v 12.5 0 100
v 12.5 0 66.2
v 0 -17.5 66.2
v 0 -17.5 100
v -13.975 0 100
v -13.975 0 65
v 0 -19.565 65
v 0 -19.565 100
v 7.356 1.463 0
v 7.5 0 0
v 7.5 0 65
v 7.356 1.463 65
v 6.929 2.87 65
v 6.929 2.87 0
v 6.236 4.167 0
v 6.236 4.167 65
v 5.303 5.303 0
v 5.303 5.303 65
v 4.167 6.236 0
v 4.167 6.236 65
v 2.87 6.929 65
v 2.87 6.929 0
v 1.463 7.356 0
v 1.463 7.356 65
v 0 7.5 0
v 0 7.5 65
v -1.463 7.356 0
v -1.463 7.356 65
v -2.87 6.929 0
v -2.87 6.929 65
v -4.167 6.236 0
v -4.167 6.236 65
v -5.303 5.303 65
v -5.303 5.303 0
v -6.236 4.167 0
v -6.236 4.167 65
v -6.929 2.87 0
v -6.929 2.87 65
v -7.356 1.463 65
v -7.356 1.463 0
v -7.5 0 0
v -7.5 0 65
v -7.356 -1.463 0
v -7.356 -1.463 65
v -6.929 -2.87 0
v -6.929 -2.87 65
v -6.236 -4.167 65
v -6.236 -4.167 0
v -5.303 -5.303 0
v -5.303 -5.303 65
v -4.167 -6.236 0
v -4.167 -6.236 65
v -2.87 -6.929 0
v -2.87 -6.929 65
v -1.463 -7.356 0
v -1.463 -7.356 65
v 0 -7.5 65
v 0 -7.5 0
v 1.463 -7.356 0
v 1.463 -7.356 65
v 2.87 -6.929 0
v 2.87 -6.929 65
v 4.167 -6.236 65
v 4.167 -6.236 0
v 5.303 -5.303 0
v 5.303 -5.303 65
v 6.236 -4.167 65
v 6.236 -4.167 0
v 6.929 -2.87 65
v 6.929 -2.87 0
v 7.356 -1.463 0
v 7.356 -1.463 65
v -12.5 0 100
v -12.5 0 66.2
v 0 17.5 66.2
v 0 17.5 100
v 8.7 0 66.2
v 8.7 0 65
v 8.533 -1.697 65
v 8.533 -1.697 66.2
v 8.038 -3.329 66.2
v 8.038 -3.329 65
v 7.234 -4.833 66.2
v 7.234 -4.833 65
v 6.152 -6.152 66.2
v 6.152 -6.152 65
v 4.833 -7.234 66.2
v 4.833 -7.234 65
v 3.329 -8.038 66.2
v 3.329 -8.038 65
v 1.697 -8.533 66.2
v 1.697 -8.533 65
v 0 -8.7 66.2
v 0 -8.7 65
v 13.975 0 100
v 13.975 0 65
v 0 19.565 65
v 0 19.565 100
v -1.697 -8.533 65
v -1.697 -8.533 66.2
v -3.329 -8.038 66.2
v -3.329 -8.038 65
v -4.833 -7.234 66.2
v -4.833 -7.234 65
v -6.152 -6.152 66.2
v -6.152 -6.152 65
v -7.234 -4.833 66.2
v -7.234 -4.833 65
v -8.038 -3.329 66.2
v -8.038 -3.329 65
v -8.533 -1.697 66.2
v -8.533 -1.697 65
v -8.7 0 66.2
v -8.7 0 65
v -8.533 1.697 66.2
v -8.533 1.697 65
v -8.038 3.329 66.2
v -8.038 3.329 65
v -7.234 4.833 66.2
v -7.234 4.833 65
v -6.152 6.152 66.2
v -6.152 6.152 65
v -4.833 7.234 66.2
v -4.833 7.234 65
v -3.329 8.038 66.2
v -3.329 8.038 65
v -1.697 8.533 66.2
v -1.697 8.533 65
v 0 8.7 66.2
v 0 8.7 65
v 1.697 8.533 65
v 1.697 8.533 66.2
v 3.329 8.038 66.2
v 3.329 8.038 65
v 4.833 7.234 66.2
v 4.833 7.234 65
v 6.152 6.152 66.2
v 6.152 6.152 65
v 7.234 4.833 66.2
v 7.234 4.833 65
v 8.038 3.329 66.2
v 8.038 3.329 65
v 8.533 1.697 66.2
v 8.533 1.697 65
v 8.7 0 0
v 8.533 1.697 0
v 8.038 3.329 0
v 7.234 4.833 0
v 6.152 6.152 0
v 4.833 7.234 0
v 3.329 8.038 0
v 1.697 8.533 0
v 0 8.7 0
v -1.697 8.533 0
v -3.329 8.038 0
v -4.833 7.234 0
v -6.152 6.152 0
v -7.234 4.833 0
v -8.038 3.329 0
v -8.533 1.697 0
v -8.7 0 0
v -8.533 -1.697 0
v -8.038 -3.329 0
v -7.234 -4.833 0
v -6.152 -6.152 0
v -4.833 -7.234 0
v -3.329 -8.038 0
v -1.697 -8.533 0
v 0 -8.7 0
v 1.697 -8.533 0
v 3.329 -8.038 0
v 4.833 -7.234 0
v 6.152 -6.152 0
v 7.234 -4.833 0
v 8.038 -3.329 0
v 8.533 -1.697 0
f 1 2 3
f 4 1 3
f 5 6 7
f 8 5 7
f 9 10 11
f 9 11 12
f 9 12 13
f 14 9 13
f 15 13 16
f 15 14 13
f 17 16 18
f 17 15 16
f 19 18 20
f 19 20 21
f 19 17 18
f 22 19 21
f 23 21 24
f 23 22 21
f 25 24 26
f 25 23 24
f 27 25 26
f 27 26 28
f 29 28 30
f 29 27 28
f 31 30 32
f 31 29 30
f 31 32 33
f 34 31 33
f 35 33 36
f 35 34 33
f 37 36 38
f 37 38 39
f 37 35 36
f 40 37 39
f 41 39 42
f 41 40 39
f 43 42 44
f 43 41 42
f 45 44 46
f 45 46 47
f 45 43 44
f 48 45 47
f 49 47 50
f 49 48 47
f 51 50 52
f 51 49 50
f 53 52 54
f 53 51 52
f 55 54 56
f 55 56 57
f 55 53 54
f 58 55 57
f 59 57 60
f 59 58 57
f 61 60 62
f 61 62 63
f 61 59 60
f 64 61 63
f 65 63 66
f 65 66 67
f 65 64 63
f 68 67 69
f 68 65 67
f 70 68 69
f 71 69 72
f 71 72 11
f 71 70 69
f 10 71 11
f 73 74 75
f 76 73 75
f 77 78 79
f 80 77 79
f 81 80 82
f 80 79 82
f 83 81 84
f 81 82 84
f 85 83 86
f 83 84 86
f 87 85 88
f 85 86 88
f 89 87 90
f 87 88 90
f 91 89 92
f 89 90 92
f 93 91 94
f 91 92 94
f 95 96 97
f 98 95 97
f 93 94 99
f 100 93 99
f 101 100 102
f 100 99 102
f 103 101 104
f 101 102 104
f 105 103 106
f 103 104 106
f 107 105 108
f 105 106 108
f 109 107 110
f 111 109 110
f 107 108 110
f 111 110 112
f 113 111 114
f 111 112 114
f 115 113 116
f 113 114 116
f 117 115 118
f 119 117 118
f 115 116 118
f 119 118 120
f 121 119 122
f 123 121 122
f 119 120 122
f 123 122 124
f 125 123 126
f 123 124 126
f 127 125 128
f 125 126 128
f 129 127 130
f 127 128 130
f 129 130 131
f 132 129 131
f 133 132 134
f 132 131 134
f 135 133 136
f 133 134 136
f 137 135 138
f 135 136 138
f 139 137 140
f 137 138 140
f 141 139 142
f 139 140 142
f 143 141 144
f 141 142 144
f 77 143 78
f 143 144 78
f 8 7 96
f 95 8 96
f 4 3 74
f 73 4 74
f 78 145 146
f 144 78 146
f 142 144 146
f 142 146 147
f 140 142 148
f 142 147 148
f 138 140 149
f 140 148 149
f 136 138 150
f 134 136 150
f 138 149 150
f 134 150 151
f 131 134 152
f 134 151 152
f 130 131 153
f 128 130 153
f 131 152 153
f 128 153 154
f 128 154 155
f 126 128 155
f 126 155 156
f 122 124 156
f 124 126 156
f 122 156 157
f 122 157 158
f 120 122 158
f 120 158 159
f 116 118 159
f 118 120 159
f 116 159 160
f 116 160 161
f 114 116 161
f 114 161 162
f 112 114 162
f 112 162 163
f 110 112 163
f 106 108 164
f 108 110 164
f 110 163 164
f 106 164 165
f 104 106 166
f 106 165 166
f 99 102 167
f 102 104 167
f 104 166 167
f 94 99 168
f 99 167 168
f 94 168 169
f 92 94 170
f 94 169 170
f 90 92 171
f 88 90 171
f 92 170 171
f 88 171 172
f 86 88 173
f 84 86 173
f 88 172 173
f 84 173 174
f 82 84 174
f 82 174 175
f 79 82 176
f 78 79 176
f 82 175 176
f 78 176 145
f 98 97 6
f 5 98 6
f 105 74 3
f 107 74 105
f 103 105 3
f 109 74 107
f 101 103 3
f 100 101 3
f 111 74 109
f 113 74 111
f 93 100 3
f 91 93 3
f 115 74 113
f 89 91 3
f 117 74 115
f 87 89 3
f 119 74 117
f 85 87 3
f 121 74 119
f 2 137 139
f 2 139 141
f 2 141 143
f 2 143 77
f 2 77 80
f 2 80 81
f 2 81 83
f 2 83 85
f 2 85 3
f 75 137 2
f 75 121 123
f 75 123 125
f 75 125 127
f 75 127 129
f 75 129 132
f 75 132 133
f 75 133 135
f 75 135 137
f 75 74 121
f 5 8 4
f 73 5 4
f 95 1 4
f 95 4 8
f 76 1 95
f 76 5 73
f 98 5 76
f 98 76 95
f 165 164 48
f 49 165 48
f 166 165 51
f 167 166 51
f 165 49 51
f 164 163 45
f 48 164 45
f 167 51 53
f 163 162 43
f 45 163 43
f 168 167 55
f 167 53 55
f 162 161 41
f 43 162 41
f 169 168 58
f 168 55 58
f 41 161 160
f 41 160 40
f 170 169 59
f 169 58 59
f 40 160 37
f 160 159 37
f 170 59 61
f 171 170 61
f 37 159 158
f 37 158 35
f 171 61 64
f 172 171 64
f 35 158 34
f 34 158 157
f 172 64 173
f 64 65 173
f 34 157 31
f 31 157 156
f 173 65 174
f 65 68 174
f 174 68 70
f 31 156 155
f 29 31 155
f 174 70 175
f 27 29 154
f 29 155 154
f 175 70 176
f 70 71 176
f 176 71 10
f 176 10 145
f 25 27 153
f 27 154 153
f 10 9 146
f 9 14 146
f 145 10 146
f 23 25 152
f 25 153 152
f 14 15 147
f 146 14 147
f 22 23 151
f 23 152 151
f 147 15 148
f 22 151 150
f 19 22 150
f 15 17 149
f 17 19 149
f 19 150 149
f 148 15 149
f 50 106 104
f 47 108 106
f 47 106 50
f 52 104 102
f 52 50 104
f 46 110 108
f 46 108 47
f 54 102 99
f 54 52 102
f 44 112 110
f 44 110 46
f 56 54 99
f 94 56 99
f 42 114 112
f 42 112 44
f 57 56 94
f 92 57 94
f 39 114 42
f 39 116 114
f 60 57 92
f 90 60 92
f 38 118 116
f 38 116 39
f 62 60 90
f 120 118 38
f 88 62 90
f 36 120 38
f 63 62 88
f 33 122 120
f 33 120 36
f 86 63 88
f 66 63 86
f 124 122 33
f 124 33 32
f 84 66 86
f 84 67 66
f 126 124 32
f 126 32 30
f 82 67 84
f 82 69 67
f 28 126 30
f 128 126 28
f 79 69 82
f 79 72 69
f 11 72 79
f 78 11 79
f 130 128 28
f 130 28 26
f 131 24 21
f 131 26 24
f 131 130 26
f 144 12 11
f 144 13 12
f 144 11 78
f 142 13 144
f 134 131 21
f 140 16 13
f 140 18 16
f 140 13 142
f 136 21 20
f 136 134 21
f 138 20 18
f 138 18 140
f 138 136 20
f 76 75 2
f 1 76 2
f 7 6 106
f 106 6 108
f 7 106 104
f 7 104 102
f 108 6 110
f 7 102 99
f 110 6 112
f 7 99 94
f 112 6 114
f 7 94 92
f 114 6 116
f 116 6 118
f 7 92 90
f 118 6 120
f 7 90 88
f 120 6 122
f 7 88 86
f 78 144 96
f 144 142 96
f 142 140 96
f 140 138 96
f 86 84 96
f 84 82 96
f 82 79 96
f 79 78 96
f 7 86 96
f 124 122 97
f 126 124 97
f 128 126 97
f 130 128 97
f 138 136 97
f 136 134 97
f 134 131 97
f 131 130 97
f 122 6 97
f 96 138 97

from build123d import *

# Parameters (mm, degrees)
F0_R     = 8.7
F0_R_2   = 7.5
F1_DEPTH = 65
F3_DEPTH = 35
F4_DEPTH = 1.2


with BuildPart() as f1:
    # F0 (on Top) → F1 (new body)
    with BuildSketch(Plane.XY):
        Circle(F0_R)
        Circle(F0_R_2, mode=Mode.SUBTRACT)
    extrude(amount=F1_DEPTH)



with BuildPart() as f3:
    # F2 (on face) → F3 (new body)
    with BuildSketch(Plane.XY.offset(65)):
        Polygon((13.974684, 0), (0, 19.564558), (-13.974684, 0), (0, -19.564558), align=None)
        Polygon((-12.5, 0), (0, 17.5), (12.5, 0), (0, -17.5), align=None, mode=Mode.SUBTRACT)
    extrude(amount=F3_DEPTH)


with BuildPart() as f1_1:
    add(f1.part)

    add(f3.part)  # F4 merges F3
    # F2 (on face) → F4 (join)
    with BuildSketch(Plane.XY.offset(65)):
        with BuildLine():
            ThreePointArc((0, -8.7), (-8.7, 0), (0, 8.7))
            Line((0, 8.7), (0, 17.5))
            Line((0, 17.5), (-12.5, 0))
            Line((-12.5, 0), (0, -17.5))
            Line((0, -17.5), (0, -8.7))
        make_face()
        with BuildLine():
            Line((0, 17.5), (0, 8.7))
            ThreePointArc((0, 8.7), (6.151829, 6.151829), (8.7, 0))
            ThreePointArc((8.7, 0), (6.151829, -6.151829), (0, -8.7))
            Line((0, -8.7), (0, -17.5))
            Line((0, -17.5), (12.5, 0))
            Line((12.5, 0), (0, 17.5))
        make_face()
    extrude(amount=F4_DEPTH)


solid = f1_1.part
